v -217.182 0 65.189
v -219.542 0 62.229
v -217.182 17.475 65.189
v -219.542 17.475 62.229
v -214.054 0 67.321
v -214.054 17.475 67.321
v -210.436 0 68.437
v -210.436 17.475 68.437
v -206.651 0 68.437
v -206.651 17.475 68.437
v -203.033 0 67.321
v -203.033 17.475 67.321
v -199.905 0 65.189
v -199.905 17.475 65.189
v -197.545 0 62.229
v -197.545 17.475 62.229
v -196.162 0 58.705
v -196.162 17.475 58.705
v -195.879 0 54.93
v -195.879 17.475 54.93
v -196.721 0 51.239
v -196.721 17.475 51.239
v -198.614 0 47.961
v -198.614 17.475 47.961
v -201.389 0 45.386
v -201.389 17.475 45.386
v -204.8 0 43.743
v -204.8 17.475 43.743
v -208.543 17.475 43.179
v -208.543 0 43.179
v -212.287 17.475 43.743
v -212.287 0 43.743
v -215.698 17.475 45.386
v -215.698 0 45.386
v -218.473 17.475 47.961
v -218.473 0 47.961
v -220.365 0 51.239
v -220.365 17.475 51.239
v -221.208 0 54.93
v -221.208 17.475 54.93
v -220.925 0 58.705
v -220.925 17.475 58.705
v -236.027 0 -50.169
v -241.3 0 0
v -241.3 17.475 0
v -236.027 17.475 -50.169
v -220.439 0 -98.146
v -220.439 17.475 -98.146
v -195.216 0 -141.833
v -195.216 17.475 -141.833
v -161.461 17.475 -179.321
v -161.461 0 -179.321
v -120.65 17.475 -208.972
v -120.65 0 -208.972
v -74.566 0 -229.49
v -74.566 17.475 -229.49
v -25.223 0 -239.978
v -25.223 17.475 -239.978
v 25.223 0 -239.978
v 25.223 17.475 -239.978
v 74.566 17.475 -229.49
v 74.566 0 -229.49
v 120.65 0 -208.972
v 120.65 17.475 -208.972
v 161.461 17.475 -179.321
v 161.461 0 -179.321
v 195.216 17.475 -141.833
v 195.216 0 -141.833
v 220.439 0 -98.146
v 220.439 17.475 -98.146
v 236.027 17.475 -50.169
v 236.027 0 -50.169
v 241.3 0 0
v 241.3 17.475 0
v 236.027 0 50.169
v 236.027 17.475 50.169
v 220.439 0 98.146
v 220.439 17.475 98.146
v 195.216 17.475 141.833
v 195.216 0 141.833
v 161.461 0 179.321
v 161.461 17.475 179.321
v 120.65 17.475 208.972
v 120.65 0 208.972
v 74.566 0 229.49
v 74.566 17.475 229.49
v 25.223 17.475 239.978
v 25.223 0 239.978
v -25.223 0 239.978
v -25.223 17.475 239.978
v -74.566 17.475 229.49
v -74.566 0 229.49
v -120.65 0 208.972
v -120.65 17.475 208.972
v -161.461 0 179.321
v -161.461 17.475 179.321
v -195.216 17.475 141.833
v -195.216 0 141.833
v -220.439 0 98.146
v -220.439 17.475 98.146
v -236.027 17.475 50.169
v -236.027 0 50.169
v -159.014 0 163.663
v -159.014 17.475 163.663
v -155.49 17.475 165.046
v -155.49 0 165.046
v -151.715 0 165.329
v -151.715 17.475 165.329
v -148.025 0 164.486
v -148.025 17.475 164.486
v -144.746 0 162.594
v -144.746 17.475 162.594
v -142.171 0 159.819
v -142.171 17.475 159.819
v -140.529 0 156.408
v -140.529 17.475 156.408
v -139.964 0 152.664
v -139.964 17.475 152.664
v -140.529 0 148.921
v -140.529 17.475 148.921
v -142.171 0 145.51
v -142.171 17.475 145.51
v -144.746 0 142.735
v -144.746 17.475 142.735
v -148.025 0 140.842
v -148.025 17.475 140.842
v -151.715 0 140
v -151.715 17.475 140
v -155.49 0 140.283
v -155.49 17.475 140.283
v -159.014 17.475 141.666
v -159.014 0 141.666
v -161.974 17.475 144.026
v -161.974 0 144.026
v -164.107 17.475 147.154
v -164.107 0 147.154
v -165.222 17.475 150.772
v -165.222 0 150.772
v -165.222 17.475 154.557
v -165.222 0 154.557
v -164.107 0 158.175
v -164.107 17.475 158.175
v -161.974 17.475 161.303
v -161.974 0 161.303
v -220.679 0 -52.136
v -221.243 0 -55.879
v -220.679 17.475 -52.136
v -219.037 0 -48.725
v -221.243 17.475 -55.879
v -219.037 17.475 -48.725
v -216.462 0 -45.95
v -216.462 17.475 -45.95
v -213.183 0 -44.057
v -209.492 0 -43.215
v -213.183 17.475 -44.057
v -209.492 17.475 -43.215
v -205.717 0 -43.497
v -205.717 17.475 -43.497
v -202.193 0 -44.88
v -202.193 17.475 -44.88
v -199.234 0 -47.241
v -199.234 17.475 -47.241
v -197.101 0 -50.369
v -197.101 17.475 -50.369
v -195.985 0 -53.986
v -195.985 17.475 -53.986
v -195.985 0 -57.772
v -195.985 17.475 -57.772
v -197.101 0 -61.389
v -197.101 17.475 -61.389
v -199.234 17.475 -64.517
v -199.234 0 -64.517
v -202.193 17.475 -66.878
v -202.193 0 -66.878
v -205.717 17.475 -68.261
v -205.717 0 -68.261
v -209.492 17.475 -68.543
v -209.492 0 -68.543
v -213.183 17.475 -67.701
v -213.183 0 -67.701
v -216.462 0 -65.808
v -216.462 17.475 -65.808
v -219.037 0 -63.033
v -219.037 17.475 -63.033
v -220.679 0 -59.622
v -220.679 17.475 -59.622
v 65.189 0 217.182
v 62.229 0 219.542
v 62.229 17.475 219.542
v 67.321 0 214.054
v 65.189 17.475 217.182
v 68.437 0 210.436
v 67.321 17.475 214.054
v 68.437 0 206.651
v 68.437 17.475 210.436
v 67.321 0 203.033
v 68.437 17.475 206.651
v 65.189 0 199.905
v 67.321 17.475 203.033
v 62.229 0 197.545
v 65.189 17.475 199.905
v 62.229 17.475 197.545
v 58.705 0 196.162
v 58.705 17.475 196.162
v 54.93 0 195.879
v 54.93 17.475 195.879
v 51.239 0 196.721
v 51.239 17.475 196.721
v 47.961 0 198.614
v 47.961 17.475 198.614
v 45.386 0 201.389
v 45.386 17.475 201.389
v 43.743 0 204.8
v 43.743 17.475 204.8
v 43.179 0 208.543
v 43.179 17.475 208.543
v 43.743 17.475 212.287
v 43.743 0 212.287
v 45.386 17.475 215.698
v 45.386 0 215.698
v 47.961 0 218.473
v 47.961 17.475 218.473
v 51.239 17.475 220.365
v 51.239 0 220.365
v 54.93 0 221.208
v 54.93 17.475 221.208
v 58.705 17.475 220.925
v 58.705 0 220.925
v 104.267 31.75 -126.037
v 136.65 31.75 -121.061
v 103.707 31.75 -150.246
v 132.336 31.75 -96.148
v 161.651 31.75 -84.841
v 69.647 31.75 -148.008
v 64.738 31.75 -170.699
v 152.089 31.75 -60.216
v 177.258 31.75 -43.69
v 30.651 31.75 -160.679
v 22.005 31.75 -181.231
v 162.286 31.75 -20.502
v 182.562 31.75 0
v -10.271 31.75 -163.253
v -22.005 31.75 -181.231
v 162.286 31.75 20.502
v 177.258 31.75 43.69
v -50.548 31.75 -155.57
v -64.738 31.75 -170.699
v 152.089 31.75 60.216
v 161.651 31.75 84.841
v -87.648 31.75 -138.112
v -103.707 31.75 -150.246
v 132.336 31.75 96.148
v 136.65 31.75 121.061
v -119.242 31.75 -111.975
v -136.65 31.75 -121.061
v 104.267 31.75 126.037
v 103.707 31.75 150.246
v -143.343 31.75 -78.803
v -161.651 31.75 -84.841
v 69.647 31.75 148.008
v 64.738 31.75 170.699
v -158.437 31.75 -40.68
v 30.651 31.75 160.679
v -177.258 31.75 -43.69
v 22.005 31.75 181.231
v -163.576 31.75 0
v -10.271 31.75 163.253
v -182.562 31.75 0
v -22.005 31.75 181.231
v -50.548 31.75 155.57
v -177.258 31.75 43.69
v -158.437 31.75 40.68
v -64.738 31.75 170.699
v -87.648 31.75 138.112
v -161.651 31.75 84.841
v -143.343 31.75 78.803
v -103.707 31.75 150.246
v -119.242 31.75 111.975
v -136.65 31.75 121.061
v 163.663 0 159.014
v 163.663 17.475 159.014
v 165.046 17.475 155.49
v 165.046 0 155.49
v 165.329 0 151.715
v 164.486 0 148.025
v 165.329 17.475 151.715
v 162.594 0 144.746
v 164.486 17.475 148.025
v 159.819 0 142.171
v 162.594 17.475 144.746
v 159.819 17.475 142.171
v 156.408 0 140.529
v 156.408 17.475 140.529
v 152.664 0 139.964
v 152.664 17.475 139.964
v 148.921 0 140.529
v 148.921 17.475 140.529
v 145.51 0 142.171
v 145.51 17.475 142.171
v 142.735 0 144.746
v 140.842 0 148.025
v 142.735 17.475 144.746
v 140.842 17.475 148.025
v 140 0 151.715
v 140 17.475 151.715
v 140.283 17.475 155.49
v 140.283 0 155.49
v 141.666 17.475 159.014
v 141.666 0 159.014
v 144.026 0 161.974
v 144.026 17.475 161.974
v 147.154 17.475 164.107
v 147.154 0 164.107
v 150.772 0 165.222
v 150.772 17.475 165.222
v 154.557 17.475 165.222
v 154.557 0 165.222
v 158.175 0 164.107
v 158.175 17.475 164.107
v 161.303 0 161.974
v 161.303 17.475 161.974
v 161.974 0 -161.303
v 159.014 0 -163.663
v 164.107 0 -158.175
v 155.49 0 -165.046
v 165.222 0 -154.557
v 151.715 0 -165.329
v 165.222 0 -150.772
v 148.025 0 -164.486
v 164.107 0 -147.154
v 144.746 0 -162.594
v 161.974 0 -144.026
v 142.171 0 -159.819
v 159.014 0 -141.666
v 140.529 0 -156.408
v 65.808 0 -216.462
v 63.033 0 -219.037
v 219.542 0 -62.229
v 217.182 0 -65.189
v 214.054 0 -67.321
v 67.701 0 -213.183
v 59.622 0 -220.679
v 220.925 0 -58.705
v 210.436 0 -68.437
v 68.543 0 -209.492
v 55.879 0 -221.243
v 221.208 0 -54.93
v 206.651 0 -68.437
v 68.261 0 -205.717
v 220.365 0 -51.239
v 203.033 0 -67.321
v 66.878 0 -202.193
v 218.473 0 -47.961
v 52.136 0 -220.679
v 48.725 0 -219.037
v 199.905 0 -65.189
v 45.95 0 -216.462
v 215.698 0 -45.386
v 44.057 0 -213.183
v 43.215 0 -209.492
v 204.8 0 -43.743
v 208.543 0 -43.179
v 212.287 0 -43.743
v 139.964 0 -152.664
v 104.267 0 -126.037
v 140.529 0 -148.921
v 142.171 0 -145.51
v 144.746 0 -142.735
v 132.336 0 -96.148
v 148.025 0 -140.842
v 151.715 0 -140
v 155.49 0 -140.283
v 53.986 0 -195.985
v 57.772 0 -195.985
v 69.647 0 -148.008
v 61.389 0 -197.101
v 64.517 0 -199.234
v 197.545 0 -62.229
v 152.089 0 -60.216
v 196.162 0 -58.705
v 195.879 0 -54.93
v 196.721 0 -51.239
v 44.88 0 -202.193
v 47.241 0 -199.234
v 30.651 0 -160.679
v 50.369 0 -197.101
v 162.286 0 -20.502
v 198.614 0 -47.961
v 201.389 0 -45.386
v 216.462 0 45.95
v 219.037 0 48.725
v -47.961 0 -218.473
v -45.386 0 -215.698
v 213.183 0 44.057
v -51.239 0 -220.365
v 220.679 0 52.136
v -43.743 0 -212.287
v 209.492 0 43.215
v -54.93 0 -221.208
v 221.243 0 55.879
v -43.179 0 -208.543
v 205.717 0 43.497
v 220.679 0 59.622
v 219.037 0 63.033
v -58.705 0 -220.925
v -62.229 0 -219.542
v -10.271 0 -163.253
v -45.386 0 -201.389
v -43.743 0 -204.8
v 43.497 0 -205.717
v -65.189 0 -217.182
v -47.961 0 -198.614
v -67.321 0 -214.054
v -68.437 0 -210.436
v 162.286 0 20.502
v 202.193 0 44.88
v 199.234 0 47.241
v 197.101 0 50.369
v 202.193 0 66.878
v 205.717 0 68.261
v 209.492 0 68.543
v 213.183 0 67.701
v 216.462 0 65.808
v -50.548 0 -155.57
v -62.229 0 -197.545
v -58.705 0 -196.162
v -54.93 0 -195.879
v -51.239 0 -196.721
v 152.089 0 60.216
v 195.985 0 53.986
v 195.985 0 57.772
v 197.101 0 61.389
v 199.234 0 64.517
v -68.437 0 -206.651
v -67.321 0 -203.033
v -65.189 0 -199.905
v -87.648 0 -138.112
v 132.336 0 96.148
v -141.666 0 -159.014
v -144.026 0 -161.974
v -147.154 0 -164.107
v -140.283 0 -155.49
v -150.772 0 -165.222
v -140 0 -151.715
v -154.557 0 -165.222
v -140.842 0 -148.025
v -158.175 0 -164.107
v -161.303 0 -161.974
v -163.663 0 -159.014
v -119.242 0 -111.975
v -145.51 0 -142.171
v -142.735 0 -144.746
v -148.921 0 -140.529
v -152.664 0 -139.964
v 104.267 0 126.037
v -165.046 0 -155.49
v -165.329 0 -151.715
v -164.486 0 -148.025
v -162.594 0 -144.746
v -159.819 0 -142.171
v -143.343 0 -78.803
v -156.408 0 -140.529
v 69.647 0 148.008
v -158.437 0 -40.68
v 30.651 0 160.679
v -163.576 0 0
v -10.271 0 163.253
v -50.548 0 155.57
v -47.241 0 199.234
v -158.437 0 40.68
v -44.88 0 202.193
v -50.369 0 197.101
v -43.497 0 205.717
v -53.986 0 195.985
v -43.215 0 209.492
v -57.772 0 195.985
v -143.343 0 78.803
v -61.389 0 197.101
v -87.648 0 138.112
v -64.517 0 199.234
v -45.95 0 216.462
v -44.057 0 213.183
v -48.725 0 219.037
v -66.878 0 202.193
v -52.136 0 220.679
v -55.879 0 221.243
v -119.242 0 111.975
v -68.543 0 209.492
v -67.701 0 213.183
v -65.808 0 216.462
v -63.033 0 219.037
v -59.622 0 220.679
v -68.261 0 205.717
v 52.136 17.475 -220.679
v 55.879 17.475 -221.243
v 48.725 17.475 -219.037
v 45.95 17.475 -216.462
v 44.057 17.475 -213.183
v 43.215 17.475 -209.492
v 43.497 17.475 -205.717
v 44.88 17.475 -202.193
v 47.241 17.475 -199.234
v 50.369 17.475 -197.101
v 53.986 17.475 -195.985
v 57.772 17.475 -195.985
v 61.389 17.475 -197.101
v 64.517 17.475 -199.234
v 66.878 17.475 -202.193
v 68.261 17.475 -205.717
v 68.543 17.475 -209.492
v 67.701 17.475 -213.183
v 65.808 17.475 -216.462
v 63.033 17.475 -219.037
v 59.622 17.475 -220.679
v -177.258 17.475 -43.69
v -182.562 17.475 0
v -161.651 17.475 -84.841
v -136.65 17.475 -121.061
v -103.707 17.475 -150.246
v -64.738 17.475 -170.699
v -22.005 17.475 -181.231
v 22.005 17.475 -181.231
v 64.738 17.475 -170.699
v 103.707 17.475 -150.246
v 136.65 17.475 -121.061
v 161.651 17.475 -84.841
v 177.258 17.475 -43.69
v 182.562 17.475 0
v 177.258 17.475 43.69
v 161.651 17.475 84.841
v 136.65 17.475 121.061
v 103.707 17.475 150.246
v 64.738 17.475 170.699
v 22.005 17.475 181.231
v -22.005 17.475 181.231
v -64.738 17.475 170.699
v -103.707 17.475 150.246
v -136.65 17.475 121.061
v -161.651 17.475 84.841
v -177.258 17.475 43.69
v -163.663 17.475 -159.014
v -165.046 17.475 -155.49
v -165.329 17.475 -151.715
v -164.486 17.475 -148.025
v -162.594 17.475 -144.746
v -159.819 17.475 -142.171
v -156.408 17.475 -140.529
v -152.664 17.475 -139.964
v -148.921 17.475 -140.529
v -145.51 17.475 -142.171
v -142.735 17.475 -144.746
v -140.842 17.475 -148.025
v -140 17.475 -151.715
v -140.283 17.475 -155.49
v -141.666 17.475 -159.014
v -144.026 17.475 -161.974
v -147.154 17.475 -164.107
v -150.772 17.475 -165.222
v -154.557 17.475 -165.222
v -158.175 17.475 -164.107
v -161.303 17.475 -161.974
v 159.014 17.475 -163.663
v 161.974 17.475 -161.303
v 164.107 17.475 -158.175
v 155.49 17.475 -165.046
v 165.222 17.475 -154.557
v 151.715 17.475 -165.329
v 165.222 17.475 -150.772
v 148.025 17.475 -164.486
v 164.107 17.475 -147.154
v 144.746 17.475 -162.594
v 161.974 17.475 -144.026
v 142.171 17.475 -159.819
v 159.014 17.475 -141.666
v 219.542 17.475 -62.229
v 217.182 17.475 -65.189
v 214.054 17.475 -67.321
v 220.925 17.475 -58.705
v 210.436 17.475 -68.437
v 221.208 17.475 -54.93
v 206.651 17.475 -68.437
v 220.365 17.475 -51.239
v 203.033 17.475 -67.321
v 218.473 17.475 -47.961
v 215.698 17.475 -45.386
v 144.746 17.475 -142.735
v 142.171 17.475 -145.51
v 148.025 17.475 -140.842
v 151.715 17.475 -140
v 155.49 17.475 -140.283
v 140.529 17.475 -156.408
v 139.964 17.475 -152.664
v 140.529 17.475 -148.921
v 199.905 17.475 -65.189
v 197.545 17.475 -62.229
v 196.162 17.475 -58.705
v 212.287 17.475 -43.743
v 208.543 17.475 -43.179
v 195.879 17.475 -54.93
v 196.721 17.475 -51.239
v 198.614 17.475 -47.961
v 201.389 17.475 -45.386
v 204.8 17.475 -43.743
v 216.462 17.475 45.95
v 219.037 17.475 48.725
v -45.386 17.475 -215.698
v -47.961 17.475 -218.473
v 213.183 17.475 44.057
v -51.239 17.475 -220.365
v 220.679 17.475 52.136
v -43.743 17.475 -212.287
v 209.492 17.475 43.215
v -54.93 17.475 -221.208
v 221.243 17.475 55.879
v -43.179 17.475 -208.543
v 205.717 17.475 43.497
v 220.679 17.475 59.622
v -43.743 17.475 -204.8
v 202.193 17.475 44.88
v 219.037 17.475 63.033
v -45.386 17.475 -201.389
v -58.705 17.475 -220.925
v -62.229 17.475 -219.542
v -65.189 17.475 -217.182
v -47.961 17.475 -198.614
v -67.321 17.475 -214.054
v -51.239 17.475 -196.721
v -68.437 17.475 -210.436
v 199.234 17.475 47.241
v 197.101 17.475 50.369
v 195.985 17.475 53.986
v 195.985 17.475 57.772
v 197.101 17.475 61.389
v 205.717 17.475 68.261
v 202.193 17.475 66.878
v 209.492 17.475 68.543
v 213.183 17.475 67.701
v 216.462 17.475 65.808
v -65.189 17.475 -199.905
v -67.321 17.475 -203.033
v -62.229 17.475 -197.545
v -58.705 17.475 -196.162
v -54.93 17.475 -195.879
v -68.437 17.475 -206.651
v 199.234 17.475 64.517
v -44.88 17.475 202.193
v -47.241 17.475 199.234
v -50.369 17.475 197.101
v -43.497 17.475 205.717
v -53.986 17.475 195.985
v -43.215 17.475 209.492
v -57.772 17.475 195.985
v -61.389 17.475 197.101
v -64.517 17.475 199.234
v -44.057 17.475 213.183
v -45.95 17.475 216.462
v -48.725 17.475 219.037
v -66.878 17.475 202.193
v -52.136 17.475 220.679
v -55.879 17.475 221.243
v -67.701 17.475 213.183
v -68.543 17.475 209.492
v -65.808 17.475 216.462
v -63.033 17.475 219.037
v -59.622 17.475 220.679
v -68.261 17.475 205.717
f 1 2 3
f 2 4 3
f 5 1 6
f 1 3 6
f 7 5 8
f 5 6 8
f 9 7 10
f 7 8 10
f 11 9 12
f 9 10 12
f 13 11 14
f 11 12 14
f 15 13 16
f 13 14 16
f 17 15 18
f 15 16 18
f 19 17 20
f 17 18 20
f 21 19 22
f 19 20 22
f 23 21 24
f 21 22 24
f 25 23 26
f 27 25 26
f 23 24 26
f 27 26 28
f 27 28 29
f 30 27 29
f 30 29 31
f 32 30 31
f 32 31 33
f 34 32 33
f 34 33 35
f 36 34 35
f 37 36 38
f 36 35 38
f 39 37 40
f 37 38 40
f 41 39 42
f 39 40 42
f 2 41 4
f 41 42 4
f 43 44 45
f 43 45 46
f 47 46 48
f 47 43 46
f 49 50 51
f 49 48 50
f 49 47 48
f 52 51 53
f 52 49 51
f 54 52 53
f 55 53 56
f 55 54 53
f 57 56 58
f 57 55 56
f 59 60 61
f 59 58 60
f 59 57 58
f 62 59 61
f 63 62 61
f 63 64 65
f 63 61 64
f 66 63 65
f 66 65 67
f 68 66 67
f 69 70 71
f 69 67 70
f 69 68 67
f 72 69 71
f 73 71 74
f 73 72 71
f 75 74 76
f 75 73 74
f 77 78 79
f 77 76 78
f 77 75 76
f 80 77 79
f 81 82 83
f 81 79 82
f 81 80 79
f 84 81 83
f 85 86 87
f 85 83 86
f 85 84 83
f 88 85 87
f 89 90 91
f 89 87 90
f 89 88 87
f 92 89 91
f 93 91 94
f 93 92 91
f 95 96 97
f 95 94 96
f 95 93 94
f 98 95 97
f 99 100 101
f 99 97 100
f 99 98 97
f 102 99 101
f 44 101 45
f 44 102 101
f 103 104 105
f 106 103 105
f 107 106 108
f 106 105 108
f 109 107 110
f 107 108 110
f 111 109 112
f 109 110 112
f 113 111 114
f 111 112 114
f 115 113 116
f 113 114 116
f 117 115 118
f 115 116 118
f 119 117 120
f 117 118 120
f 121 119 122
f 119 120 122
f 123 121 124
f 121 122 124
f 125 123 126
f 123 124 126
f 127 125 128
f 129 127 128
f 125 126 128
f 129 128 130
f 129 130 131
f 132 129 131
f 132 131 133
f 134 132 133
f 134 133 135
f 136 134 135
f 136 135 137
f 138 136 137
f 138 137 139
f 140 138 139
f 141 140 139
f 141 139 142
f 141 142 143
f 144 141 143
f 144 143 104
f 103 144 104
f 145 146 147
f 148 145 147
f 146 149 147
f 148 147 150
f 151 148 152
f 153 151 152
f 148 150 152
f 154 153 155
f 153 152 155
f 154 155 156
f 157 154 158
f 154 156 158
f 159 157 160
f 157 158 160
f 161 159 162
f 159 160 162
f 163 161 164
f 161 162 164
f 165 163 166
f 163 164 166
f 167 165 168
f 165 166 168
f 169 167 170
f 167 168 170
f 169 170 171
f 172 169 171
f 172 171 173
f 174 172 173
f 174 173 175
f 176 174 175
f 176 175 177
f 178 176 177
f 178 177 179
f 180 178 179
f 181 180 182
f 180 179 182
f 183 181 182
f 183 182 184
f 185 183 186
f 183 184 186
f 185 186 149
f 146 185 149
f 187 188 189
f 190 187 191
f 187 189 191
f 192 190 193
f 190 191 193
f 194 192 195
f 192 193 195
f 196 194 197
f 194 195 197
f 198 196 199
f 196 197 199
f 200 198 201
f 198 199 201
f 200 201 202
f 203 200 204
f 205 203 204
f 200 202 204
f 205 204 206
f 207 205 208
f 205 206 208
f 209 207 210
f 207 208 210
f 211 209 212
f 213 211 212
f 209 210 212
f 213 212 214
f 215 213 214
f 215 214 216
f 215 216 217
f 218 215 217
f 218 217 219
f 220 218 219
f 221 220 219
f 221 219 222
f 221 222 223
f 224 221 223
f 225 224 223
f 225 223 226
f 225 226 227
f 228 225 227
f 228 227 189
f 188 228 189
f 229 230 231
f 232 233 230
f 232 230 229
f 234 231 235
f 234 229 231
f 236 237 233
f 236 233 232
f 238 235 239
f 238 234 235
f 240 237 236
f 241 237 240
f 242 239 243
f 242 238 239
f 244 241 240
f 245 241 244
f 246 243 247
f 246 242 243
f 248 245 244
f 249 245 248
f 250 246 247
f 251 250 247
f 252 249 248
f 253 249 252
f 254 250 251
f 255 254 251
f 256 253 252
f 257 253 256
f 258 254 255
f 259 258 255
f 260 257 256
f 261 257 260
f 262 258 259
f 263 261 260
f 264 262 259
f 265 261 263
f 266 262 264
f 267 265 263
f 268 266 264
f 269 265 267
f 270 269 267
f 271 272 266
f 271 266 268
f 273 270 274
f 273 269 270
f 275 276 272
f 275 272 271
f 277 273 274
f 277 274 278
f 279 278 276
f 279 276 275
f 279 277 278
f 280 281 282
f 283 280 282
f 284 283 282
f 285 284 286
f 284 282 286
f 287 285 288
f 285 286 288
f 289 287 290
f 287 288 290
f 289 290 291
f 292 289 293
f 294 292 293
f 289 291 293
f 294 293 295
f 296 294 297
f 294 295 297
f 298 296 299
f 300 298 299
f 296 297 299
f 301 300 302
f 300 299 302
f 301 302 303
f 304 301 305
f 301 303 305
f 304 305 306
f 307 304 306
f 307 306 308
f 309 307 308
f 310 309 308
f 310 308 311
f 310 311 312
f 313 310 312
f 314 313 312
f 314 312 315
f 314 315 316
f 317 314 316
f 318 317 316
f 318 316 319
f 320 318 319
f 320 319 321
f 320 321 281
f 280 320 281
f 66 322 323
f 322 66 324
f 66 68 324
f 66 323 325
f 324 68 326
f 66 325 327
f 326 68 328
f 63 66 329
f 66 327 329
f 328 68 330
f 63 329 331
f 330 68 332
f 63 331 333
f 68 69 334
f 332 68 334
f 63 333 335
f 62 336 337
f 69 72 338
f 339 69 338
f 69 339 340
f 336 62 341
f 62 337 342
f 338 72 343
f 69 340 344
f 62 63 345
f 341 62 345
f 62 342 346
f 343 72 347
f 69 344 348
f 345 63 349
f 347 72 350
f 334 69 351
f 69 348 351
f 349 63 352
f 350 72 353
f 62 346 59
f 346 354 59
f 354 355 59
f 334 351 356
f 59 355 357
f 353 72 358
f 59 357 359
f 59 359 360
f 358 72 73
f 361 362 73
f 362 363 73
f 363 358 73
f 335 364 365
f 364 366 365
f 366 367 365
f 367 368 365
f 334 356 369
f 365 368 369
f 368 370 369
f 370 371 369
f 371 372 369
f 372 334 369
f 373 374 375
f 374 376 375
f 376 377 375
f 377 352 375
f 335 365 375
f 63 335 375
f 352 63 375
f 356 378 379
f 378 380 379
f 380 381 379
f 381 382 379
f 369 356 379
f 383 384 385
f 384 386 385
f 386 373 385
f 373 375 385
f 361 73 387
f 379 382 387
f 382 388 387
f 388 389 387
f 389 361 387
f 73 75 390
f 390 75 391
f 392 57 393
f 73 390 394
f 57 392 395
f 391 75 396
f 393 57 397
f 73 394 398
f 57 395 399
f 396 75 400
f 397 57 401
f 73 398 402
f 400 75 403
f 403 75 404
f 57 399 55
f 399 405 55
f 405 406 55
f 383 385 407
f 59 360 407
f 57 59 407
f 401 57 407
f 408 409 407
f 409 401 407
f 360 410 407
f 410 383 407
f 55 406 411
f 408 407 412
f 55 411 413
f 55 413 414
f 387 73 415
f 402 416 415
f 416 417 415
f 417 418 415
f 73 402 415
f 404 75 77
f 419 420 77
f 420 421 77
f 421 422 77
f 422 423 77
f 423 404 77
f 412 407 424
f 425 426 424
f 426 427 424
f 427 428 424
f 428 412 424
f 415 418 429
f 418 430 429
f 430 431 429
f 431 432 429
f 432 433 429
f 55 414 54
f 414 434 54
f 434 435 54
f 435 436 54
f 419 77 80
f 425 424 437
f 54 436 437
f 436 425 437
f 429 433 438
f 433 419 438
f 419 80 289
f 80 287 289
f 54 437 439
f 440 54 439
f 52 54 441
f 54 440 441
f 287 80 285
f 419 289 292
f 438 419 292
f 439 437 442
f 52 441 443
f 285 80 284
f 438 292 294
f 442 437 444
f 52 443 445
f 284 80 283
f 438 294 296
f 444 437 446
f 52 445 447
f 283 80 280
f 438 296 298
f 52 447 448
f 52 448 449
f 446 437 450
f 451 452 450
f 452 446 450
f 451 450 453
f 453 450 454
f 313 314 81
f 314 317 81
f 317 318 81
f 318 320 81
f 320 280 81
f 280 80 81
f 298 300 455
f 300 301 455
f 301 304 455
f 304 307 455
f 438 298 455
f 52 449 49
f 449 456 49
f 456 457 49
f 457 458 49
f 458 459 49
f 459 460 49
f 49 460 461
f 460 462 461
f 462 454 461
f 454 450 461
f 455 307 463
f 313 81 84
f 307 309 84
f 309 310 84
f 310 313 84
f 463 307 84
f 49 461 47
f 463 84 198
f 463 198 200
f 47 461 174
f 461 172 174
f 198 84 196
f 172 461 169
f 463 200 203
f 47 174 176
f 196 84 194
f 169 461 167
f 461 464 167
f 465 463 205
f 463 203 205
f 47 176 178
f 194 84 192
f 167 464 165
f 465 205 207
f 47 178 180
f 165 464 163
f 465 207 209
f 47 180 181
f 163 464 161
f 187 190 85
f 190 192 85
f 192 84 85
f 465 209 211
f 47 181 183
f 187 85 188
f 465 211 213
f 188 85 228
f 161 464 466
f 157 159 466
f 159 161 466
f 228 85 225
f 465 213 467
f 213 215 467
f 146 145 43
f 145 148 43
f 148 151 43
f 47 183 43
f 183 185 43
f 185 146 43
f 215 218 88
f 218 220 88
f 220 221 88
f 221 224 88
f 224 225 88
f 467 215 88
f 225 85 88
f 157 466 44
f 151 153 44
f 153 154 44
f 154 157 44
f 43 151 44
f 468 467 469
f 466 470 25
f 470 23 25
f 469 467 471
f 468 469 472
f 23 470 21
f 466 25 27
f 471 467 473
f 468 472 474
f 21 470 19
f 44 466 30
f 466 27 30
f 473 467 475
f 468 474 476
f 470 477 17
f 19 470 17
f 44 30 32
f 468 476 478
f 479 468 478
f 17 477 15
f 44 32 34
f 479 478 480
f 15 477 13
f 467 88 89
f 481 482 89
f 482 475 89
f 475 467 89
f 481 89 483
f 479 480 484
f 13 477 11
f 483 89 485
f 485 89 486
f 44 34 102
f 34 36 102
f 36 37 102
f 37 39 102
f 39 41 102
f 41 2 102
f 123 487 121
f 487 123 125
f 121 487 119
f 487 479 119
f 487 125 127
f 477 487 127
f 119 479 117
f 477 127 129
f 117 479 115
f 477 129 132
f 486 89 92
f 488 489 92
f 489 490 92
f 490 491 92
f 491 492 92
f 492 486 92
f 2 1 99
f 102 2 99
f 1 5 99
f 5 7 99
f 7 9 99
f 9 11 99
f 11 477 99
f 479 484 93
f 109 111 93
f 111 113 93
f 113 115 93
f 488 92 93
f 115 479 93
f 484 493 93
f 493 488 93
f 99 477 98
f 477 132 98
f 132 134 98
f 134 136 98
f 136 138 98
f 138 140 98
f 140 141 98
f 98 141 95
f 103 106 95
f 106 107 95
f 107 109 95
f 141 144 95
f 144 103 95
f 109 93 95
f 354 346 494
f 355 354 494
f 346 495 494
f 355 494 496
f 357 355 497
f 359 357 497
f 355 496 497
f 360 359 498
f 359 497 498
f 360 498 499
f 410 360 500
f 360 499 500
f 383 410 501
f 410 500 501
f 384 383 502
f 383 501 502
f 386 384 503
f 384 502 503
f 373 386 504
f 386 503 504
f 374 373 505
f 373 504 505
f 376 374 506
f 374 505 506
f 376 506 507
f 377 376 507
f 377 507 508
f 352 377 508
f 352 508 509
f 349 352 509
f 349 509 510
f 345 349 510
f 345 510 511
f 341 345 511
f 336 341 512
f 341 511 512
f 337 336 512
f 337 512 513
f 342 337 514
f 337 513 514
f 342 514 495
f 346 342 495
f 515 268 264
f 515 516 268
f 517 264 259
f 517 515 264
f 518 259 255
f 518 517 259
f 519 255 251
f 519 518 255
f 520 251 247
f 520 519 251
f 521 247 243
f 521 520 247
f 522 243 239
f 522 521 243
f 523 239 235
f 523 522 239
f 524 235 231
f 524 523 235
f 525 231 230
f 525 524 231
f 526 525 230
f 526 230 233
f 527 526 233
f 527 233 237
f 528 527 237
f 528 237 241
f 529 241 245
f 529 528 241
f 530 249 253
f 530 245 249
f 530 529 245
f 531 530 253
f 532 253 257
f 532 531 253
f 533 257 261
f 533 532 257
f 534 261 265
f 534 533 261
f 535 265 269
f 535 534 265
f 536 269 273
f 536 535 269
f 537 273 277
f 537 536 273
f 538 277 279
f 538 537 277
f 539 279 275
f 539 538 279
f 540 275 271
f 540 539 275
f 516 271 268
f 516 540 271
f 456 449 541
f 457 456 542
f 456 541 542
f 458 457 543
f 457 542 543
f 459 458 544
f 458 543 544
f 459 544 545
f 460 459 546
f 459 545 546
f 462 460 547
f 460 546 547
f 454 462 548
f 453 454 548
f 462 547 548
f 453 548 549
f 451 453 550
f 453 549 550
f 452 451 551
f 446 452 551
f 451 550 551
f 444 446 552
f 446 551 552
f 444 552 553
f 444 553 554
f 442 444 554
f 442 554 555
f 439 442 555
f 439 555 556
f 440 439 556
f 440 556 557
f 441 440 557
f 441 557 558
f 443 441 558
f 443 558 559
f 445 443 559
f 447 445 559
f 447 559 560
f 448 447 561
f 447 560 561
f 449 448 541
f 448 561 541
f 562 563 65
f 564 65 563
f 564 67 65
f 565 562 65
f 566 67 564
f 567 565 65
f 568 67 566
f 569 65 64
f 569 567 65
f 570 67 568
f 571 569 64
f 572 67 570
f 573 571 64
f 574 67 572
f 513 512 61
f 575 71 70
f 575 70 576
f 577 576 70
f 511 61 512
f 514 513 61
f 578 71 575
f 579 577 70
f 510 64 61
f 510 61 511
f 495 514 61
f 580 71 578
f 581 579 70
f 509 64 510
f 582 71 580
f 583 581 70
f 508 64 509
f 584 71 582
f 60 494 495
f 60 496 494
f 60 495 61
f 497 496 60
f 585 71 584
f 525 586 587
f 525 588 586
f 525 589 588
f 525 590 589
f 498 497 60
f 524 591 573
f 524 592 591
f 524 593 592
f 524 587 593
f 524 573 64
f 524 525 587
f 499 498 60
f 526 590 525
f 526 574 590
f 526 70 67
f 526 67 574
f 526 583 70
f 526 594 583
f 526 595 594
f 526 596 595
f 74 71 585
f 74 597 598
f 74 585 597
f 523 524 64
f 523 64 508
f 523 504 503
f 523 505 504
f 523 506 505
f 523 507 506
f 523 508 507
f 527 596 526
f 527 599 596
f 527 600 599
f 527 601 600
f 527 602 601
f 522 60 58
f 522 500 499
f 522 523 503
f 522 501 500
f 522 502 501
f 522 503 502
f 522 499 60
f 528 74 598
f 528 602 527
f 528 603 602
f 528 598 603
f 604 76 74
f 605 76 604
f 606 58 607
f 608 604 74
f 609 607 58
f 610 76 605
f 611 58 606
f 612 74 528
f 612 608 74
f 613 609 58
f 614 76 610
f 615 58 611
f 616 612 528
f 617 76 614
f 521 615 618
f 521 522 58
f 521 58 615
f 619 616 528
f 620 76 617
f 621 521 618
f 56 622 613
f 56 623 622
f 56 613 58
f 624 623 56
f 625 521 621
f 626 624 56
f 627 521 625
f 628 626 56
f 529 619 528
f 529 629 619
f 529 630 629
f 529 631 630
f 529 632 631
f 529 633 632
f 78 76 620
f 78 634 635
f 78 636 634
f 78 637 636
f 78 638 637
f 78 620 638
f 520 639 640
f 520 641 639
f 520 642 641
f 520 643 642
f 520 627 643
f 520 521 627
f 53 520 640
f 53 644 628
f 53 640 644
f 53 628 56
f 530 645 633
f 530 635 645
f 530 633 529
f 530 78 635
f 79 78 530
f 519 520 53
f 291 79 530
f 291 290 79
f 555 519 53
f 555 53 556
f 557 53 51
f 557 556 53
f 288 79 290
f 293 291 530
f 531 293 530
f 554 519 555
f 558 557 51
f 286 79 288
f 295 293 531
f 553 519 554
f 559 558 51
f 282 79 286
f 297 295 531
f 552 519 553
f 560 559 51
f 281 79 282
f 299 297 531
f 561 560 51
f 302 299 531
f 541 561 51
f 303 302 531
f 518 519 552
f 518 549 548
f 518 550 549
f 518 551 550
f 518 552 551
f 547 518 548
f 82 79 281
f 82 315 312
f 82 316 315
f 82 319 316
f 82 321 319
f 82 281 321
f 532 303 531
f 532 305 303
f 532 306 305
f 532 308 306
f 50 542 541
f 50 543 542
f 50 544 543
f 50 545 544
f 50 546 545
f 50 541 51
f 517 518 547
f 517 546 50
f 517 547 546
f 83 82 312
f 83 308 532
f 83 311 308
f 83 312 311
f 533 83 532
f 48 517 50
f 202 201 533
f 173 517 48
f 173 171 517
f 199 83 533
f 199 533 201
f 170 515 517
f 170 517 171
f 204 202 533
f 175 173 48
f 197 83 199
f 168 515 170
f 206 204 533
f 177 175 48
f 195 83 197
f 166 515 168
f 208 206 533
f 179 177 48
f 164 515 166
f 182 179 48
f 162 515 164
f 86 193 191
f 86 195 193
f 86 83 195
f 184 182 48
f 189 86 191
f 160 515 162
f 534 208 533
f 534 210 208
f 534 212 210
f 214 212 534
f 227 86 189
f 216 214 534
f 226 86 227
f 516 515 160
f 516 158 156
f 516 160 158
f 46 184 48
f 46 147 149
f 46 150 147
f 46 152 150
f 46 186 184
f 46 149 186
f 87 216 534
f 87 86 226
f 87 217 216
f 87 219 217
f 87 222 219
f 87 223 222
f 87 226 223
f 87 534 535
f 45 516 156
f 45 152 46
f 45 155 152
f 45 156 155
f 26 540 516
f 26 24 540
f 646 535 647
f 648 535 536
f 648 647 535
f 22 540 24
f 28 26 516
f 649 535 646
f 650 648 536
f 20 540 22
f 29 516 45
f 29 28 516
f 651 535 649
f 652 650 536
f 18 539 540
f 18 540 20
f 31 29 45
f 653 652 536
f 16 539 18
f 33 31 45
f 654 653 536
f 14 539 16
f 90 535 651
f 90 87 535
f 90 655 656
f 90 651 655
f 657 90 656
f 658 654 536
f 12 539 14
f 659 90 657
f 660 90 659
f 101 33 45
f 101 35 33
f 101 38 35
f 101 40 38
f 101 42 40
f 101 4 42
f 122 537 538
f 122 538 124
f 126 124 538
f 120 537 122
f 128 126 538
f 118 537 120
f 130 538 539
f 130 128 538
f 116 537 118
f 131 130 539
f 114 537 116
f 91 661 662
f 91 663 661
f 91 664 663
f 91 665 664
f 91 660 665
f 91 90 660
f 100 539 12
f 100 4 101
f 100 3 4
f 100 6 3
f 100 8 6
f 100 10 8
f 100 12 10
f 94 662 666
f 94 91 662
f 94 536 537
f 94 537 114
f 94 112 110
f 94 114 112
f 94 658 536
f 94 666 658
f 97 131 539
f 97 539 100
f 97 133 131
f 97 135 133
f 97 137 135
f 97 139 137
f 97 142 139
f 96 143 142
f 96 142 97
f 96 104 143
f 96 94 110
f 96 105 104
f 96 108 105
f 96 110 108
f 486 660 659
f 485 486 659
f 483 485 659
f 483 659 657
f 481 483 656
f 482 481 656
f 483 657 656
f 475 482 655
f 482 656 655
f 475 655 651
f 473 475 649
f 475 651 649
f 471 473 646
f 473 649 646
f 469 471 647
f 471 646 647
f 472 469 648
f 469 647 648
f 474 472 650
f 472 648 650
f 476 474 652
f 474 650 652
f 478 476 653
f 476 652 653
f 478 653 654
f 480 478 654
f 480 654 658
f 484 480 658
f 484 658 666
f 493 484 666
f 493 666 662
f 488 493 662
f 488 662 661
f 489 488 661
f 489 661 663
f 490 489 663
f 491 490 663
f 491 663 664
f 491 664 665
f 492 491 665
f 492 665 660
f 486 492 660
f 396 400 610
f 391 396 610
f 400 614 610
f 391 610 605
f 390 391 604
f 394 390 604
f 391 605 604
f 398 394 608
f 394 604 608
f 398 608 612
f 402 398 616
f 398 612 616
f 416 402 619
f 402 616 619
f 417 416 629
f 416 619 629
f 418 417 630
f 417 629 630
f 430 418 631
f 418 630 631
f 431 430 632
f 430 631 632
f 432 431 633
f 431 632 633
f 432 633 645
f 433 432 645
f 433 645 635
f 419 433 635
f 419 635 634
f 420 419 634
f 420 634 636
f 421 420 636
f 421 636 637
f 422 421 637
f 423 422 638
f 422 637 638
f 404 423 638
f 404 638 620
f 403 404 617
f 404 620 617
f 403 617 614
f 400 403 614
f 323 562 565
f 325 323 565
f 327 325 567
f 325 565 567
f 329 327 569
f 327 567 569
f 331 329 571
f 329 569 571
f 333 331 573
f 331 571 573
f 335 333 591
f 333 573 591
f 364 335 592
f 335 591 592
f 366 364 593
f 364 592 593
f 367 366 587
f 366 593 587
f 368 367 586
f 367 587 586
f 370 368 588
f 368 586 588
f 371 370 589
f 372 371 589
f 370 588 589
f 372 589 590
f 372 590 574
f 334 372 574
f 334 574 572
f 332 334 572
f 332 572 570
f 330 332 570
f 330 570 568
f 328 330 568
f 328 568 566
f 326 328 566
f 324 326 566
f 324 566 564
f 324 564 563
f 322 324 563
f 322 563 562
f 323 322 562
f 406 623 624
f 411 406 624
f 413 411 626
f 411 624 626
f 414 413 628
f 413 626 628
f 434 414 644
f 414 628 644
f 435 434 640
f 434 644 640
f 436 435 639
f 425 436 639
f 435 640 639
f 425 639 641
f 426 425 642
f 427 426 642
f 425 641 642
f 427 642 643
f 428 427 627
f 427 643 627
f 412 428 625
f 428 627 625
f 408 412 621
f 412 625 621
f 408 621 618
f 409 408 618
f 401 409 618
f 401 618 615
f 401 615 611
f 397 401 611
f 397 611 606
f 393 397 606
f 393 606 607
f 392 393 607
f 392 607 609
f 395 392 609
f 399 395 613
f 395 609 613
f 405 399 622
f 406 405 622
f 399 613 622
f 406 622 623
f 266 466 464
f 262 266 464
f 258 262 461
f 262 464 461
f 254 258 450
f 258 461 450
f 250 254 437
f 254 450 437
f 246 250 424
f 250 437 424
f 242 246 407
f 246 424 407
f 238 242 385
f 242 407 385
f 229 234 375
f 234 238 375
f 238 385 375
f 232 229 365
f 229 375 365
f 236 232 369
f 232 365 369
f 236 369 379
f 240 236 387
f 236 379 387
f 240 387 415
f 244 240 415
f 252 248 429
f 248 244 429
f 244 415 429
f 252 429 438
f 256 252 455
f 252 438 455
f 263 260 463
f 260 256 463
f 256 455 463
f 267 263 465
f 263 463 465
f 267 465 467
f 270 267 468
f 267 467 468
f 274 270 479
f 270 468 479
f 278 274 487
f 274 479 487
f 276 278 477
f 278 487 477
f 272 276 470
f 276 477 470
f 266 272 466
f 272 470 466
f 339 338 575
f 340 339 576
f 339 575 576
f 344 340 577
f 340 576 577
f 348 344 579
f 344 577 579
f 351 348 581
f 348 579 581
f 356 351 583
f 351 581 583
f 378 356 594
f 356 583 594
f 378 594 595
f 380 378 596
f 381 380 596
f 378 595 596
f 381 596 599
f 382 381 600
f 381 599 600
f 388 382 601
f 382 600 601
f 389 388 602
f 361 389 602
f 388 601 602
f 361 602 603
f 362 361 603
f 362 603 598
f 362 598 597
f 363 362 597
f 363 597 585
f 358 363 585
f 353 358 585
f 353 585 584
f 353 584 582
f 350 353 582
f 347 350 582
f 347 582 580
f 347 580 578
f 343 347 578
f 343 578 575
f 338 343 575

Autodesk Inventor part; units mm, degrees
ref_plane "YZ Plane" through (0, 0, 0) normal (1, 0, 0) x (0, 1, 0)
ref_plane "XZ Plane" through (0, 0, 0) normal (0, 1, 0) x (-1, 0, 0)
ref_plane "XY Plane" through (0, 0, 0) normal (0, 0, 1) x (1, 0, 0)
sketch "Flange Sketch" plane through (0, 0, 0) normal (0, 1, 0) x (-1, 0, 0)
  circle A0 centre (0, 0) radius 241.3
  circle A1 centre (0, 0) radius 163.576
  circle A2 centre (0, 0) radius 215.9 construction
  line L0 (0, 0) -> (-55.879, -208.5434) construction
  line L1 (0, 0) -> (0, -215.9) construction
  circle A3 centre (0, 0) radius 182.5625
  dimension "outerDiam" = 482.6
  dimension "innerDiam" = 327.152
  dimension "boltCircle" = 431.8
  dimension "boltOffsetAngle" = 15
  dimension "dimensionE" = 365.125
extrude "Flange Extrusion" add sketch "Flange Sketch" along normal blind 17.4752 contours A0 | A3
extrude "Flange Exrusion2" add sketch "Flange Sketch" along normal blind 31.75 contours A3
hole "Bolt Hole" at (55.879, 0, -208.5434) direction (0, 1, 0) diameter 25.4 depth 17.4752
pattern_circular "Bolt Hole Pattern" count 12 over 360 about axis through (0, -10, 0) along (0, 1, 0) of "Bolt Hole"
equation "\"nominalSize\" = 304.8"
properties part number "AWWA C207-18 Class B Ring and Blind Flange"
